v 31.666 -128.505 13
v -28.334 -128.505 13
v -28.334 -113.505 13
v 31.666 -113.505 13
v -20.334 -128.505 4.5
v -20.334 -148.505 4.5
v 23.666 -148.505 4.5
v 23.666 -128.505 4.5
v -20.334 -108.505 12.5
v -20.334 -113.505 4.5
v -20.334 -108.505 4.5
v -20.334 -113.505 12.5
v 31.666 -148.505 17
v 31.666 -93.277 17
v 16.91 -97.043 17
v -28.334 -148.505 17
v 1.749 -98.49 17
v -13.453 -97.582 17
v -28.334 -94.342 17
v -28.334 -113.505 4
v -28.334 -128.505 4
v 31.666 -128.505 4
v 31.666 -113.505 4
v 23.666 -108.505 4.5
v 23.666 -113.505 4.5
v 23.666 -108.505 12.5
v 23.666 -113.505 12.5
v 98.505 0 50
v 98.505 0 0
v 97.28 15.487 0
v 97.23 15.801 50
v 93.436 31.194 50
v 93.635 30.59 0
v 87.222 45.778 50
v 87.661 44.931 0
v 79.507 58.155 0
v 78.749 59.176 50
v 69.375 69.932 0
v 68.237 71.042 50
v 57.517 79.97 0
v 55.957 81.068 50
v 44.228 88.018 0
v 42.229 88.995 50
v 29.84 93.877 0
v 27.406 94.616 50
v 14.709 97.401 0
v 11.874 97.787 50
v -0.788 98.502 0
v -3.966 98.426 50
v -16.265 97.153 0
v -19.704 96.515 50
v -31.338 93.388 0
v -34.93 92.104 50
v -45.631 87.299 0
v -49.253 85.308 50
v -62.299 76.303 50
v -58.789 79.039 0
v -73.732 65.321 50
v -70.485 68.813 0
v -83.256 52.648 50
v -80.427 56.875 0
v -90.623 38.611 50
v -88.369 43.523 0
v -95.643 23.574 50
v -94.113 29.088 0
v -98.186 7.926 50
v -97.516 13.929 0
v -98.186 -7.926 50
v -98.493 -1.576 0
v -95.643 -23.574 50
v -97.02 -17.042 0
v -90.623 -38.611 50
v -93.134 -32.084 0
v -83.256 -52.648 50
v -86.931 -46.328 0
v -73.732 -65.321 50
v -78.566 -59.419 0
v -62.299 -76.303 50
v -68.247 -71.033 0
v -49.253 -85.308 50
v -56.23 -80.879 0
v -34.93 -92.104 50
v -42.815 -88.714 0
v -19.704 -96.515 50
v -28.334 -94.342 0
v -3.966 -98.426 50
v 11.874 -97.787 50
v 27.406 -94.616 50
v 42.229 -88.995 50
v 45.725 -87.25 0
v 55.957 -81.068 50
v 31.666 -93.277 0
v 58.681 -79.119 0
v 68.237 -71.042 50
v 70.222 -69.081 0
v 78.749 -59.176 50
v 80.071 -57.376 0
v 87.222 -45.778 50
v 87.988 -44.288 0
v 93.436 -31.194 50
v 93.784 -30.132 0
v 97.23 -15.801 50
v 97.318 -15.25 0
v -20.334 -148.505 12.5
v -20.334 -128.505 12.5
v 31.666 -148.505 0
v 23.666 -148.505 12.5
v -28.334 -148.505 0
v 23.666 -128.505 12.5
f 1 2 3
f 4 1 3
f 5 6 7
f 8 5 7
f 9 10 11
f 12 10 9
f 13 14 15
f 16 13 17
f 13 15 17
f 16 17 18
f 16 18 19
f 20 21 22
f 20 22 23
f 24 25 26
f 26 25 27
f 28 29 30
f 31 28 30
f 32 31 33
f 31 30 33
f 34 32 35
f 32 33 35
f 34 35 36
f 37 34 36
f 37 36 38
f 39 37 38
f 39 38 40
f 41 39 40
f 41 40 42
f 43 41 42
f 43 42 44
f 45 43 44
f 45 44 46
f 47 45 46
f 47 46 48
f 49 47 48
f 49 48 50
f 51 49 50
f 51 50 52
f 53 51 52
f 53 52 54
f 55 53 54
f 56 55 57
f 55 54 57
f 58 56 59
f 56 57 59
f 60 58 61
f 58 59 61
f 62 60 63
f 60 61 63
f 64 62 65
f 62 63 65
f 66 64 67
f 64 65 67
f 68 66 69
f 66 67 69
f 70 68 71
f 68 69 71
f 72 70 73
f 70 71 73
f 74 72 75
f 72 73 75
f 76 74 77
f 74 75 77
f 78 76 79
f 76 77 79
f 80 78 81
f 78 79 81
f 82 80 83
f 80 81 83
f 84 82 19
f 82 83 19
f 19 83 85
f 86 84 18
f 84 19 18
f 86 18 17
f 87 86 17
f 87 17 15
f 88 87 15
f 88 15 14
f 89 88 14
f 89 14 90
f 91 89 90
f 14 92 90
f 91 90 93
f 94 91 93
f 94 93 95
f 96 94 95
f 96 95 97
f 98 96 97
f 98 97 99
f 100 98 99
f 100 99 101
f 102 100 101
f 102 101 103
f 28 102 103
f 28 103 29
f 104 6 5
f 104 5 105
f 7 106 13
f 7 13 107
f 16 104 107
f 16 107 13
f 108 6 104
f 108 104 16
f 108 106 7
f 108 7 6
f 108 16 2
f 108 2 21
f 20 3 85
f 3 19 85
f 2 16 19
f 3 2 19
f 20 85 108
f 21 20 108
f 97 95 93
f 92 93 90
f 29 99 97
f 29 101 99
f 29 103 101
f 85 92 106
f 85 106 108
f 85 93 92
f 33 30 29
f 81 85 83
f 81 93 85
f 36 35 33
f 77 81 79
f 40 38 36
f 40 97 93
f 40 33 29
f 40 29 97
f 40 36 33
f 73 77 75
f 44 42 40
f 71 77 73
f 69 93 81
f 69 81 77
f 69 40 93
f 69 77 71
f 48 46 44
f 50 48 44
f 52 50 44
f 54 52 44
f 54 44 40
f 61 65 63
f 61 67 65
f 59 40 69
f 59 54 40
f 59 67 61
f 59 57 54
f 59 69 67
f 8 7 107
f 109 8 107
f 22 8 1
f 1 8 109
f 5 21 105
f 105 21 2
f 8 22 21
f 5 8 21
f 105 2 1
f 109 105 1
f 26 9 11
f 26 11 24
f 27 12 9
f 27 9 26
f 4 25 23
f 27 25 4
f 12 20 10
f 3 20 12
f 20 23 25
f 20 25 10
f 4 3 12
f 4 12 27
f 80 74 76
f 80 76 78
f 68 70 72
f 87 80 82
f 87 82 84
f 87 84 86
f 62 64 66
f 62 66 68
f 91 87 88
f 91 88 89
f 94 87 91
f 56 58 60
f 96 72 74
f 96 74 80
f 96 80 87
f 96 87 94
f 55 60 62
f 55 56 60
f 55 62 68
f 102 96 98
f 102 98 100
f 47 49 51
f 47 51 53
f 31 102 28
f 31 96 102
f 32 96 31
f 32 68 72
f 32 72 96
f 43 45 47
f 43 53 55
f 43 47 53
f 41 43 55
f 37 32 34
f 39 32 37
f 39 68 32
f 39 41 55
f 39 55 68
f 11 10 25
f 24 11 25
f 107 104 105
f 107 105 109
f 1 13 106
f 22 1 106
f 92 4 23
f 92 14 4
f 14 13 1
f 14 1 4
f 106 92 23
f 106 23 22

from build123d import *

# Parameters (mm, degrees)
SKETCH1_R           = 98.505410199
BOSS_EXTRUDE1_DEPTH = 50
BOSS_EXTRUDE2_START = -5.228497
SKETCH2_W           = 60
SKETCH2_H           = 17
BOSS_EXTRUDE2_DEPTH = 55.228497
SKETCH3_W           = 44
SKETCH3_H           = 8
CUT_EXTRUDE1_DEPTH  = 40
SKETCH4_W           = 9
SKETCH4_H           = 15
CUT_EXTRUDE2_DEPTH  = 127.839445164


with BuildPart() as part:
    # Sketch1 → Boss-Extrude1 (new body)
    with BuildSketch(Plane.XY):
        Circle(SKETCH1_R)
    extrude(amount=BOSS_EXTRUDE1_DEPTH)

    # Sketch2 → Boss-Extrude2 (add)
    with BuildSketch(Plane(origin=(0, -98.505410199, 0), x_dir=(-1, 0, 0), z_dir=(0, -1, 0)).offset(BOSS_EXTRUDE2_START)):
        with Locations((-1.665965035, -8.5)):
            Rectangle(SKETCH2_W, SKETCH2_H)
    extrude(amount=BOSS_EXTRUDE2_DEPTH)

    # Sketch3 → Cut-Extrude1 (cut)
    with BuildSketch(Plane.XZ.offset(148.505410199)):
        with Locations((1.665965035, 8.5)):
            Rectangle(SKETCH3_W, SKETCH3_H)
    extrude(amount=-CUT_EXTRUDE1_DEPTH, mode=Mode.SUBTRACT)

    # Sketch4 → Cut-Extrude2 (cut, through all)
    with BuildSketch(Plane.ZY.offset(28.334034965)):
        with Locations((8.5, -121.005410199)):
            Rectangle(SKETCH4_W, SKETCH4_H)
    extrude(amount=-CUT_EXTRUDE2_DEPTH, mode=Mode.SUBTRACT)


solid = part.part
